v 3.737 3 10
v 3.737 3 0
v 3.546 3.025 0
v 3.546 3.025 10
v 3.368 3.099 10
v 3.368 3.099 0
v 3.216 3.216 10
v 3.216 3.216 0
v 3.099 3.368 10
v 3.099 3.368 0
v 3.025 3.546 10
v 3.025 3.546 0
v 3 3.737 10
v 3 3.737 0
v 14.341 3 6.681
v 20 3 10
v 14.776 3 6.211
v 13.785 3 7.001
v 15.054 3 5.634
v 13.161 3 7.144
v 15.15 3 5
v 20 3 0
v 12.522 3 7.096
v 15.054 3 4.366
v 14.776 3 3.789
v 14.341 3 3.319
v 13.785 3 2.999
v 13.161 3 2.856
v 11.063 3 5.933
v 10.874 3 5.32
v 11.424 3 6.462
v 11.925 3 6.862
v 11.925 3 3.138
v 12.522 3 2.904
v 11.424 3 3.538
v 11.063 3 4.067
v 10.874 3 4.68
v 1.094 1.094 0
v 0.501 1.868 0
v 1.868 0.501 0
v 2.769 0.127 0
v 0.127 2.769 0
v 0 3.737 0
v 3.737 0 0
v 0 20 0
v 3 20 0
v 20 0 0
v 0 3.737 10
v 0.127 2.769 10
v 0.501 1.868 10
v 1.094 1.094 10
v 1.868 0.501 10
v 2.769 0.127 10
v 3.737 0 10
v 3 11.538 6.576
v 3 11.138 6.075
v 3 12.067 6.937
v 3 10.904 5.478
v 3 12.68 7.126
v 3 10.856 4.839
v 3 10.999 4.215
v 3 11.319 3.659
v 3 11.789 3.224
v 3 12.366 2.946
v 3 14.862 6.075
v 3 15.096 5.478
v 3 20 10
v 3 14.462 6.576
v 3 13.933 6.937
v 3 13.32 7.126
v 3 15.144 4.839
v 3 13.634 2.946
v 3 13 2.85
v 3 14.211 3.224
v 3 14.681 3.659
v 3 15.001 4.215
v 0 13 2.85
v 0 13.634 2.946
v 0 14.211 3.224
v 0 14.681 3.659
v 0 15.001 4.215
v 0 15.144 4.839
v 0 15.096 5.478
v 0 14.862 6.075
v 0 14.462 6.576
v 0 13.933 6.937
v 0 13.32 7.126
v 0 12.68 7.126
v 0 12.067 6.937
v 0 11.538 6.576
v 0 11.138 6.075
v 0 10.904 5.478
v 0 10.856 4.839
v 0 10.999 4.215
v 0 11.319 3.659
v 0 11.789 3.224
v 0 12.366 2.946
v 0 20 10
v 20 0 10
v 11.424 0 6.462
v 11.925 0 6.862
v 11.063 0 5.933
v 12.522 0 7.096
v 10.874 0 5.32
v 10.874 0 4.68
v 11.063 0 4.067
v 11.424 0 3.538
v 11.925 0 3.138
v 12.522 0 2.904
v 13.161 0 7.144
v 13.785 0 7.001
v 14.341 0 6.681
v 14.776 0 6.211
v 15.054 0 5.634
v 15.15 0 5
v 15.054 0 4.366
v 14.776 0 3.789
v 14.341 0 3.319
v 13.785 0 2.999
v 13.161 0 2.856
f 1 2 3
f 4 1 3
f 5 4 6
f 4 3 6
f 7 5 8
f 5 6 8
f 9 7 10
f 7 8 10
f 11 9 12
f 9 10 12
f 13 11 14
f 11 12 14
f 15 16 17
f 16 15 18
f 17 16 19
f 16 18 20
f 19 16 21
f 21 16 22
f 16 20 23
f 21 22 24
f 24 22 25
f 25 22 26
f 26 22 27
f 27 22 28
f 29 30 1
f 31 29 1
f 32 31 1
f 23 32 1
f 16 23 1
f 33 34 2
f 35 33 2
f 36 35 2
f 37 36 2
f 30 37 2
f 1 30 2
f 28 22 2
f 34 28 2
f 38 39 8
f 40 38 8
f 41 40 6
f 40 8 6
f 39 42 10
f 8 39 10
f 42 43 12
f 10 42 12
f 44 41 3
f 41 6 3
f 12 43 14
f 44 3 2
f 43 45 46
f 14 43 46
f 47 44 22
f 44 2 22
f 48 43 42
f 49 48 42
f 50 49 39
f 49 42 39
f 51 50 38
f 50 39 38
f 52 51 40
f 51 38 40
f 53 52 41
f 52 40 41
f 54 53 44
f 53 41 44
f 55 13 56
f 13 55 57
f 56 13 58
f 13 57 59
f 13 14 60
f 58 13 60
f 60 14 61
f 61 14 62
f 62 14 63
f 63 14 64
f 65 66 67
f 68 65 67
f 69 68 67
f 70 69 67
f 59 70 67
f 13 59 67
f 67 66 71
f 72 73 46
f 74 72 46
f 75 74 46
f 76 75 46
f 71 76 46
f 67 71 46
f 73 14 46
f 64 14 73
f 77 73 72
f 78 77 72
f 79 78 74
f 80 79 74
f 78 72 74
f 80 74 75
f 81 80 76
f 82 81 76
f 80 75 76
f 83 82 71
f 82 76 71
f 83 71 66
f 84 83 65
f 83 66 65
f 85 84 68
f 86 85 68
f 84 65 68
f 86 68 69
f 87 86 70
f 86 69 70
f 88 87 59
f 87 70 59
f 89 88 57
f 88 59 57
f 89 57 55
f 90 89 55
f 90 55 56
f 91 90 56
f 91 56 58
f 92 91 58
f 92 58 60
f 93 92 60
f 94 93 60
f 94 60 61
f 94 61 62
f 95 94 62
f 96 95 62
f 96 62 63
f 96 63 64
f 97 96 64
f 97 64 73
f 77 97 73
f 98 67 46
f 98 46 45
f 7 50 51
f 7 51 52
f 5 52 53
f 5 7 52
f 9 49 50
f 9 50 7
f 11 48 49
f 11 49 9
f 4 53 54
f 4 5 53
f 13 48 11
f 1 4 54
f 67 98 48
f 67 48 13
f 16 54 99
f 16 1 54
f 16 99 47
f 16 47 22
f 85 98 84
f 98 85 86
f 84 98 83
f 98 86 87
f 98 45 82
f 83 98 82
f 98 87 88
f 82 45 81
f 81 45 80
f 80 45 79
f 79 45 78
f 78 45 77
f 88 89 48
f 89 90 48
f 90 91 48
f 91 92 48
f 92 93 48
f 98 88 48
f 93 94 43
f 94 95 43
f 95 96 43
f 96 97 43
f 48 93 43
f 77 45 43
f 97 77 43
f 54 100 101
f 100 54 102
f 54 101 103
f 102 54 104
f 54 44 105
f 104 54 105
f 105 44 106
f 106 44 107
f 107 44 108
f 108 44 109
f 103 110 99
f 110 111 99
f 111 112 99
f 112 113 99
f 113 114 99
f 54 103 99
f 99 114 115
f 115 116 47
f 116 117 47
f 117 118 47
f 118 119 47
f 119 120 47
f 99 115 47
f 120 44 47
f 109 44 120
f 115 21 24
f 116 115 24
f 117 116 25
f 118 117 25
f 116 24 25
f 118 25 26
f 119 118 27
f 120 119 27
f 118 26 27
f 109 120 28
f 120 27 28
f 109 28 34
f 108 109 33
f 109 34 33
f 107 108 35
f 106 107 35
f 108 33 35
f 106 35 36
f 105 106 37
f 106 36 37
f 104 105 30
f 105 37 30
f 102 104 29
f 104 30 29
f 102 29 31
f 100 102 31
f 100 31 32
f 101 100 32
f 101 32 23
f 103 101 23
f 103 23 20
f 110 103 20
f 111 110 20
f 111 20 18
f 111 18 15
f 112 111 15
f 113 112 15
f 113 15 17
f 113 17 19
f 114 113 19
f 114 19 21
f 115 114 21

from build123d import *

# Parameters (mm, degrees)
SM_BASE_FLANGE_2_DEPTH  = 10
HOLE_WIZARD_4_3_4_3_1_D = 4.3
HOLE_WIZARD_4_3_4_3_2_D = 4.3


# Sheet-metal steps are written as plain solids
with BuildPart() as part:
    # 草图18 → 基体-法兰2 (new body)
    with BuildSketch(Plane.XY):
        with BuildLine():
            Line((0, 20), (0, 3.7366))
            ThreePointArc((0, 3.7366), (1.094424801, 1.094424801), (3.7366, 0))
            Line((3.7366, 0), (20, 0))
            Line((20, 0), (20, 3))
            Line((20, 3), (3.7366, 3))
            ThreePointArc((3.7366, 3), (3.215745145, 3.215745145), (3, 3.7366))
            Line((3, 3.7366), (3, 20))
            Line((3, 20), (0, 20))
        make_face()
    extrude(amount=SM_BASE_FLANGE_2_DEPTH)

    # Ø4.3 (4.3) 直径孔1 (through all)
    with Locations(Plane.ZY):
        with Locations((5, 13)):
            Hole(HOLE_WIZARD_4_3_4_3_1_D / 2)

    # Ø4.3 (4.3) 直径孔2 (through all)
    with Locations(Plane(origin=(0, 0, 0), x_dir=(-1, 0, 0), z_dir=(0, -1, 0))):
        with Locations((-13, -5)):
            Hole(HOLE_WIZARD_4_3_4_3_2_D / 2)


solid = part.part
